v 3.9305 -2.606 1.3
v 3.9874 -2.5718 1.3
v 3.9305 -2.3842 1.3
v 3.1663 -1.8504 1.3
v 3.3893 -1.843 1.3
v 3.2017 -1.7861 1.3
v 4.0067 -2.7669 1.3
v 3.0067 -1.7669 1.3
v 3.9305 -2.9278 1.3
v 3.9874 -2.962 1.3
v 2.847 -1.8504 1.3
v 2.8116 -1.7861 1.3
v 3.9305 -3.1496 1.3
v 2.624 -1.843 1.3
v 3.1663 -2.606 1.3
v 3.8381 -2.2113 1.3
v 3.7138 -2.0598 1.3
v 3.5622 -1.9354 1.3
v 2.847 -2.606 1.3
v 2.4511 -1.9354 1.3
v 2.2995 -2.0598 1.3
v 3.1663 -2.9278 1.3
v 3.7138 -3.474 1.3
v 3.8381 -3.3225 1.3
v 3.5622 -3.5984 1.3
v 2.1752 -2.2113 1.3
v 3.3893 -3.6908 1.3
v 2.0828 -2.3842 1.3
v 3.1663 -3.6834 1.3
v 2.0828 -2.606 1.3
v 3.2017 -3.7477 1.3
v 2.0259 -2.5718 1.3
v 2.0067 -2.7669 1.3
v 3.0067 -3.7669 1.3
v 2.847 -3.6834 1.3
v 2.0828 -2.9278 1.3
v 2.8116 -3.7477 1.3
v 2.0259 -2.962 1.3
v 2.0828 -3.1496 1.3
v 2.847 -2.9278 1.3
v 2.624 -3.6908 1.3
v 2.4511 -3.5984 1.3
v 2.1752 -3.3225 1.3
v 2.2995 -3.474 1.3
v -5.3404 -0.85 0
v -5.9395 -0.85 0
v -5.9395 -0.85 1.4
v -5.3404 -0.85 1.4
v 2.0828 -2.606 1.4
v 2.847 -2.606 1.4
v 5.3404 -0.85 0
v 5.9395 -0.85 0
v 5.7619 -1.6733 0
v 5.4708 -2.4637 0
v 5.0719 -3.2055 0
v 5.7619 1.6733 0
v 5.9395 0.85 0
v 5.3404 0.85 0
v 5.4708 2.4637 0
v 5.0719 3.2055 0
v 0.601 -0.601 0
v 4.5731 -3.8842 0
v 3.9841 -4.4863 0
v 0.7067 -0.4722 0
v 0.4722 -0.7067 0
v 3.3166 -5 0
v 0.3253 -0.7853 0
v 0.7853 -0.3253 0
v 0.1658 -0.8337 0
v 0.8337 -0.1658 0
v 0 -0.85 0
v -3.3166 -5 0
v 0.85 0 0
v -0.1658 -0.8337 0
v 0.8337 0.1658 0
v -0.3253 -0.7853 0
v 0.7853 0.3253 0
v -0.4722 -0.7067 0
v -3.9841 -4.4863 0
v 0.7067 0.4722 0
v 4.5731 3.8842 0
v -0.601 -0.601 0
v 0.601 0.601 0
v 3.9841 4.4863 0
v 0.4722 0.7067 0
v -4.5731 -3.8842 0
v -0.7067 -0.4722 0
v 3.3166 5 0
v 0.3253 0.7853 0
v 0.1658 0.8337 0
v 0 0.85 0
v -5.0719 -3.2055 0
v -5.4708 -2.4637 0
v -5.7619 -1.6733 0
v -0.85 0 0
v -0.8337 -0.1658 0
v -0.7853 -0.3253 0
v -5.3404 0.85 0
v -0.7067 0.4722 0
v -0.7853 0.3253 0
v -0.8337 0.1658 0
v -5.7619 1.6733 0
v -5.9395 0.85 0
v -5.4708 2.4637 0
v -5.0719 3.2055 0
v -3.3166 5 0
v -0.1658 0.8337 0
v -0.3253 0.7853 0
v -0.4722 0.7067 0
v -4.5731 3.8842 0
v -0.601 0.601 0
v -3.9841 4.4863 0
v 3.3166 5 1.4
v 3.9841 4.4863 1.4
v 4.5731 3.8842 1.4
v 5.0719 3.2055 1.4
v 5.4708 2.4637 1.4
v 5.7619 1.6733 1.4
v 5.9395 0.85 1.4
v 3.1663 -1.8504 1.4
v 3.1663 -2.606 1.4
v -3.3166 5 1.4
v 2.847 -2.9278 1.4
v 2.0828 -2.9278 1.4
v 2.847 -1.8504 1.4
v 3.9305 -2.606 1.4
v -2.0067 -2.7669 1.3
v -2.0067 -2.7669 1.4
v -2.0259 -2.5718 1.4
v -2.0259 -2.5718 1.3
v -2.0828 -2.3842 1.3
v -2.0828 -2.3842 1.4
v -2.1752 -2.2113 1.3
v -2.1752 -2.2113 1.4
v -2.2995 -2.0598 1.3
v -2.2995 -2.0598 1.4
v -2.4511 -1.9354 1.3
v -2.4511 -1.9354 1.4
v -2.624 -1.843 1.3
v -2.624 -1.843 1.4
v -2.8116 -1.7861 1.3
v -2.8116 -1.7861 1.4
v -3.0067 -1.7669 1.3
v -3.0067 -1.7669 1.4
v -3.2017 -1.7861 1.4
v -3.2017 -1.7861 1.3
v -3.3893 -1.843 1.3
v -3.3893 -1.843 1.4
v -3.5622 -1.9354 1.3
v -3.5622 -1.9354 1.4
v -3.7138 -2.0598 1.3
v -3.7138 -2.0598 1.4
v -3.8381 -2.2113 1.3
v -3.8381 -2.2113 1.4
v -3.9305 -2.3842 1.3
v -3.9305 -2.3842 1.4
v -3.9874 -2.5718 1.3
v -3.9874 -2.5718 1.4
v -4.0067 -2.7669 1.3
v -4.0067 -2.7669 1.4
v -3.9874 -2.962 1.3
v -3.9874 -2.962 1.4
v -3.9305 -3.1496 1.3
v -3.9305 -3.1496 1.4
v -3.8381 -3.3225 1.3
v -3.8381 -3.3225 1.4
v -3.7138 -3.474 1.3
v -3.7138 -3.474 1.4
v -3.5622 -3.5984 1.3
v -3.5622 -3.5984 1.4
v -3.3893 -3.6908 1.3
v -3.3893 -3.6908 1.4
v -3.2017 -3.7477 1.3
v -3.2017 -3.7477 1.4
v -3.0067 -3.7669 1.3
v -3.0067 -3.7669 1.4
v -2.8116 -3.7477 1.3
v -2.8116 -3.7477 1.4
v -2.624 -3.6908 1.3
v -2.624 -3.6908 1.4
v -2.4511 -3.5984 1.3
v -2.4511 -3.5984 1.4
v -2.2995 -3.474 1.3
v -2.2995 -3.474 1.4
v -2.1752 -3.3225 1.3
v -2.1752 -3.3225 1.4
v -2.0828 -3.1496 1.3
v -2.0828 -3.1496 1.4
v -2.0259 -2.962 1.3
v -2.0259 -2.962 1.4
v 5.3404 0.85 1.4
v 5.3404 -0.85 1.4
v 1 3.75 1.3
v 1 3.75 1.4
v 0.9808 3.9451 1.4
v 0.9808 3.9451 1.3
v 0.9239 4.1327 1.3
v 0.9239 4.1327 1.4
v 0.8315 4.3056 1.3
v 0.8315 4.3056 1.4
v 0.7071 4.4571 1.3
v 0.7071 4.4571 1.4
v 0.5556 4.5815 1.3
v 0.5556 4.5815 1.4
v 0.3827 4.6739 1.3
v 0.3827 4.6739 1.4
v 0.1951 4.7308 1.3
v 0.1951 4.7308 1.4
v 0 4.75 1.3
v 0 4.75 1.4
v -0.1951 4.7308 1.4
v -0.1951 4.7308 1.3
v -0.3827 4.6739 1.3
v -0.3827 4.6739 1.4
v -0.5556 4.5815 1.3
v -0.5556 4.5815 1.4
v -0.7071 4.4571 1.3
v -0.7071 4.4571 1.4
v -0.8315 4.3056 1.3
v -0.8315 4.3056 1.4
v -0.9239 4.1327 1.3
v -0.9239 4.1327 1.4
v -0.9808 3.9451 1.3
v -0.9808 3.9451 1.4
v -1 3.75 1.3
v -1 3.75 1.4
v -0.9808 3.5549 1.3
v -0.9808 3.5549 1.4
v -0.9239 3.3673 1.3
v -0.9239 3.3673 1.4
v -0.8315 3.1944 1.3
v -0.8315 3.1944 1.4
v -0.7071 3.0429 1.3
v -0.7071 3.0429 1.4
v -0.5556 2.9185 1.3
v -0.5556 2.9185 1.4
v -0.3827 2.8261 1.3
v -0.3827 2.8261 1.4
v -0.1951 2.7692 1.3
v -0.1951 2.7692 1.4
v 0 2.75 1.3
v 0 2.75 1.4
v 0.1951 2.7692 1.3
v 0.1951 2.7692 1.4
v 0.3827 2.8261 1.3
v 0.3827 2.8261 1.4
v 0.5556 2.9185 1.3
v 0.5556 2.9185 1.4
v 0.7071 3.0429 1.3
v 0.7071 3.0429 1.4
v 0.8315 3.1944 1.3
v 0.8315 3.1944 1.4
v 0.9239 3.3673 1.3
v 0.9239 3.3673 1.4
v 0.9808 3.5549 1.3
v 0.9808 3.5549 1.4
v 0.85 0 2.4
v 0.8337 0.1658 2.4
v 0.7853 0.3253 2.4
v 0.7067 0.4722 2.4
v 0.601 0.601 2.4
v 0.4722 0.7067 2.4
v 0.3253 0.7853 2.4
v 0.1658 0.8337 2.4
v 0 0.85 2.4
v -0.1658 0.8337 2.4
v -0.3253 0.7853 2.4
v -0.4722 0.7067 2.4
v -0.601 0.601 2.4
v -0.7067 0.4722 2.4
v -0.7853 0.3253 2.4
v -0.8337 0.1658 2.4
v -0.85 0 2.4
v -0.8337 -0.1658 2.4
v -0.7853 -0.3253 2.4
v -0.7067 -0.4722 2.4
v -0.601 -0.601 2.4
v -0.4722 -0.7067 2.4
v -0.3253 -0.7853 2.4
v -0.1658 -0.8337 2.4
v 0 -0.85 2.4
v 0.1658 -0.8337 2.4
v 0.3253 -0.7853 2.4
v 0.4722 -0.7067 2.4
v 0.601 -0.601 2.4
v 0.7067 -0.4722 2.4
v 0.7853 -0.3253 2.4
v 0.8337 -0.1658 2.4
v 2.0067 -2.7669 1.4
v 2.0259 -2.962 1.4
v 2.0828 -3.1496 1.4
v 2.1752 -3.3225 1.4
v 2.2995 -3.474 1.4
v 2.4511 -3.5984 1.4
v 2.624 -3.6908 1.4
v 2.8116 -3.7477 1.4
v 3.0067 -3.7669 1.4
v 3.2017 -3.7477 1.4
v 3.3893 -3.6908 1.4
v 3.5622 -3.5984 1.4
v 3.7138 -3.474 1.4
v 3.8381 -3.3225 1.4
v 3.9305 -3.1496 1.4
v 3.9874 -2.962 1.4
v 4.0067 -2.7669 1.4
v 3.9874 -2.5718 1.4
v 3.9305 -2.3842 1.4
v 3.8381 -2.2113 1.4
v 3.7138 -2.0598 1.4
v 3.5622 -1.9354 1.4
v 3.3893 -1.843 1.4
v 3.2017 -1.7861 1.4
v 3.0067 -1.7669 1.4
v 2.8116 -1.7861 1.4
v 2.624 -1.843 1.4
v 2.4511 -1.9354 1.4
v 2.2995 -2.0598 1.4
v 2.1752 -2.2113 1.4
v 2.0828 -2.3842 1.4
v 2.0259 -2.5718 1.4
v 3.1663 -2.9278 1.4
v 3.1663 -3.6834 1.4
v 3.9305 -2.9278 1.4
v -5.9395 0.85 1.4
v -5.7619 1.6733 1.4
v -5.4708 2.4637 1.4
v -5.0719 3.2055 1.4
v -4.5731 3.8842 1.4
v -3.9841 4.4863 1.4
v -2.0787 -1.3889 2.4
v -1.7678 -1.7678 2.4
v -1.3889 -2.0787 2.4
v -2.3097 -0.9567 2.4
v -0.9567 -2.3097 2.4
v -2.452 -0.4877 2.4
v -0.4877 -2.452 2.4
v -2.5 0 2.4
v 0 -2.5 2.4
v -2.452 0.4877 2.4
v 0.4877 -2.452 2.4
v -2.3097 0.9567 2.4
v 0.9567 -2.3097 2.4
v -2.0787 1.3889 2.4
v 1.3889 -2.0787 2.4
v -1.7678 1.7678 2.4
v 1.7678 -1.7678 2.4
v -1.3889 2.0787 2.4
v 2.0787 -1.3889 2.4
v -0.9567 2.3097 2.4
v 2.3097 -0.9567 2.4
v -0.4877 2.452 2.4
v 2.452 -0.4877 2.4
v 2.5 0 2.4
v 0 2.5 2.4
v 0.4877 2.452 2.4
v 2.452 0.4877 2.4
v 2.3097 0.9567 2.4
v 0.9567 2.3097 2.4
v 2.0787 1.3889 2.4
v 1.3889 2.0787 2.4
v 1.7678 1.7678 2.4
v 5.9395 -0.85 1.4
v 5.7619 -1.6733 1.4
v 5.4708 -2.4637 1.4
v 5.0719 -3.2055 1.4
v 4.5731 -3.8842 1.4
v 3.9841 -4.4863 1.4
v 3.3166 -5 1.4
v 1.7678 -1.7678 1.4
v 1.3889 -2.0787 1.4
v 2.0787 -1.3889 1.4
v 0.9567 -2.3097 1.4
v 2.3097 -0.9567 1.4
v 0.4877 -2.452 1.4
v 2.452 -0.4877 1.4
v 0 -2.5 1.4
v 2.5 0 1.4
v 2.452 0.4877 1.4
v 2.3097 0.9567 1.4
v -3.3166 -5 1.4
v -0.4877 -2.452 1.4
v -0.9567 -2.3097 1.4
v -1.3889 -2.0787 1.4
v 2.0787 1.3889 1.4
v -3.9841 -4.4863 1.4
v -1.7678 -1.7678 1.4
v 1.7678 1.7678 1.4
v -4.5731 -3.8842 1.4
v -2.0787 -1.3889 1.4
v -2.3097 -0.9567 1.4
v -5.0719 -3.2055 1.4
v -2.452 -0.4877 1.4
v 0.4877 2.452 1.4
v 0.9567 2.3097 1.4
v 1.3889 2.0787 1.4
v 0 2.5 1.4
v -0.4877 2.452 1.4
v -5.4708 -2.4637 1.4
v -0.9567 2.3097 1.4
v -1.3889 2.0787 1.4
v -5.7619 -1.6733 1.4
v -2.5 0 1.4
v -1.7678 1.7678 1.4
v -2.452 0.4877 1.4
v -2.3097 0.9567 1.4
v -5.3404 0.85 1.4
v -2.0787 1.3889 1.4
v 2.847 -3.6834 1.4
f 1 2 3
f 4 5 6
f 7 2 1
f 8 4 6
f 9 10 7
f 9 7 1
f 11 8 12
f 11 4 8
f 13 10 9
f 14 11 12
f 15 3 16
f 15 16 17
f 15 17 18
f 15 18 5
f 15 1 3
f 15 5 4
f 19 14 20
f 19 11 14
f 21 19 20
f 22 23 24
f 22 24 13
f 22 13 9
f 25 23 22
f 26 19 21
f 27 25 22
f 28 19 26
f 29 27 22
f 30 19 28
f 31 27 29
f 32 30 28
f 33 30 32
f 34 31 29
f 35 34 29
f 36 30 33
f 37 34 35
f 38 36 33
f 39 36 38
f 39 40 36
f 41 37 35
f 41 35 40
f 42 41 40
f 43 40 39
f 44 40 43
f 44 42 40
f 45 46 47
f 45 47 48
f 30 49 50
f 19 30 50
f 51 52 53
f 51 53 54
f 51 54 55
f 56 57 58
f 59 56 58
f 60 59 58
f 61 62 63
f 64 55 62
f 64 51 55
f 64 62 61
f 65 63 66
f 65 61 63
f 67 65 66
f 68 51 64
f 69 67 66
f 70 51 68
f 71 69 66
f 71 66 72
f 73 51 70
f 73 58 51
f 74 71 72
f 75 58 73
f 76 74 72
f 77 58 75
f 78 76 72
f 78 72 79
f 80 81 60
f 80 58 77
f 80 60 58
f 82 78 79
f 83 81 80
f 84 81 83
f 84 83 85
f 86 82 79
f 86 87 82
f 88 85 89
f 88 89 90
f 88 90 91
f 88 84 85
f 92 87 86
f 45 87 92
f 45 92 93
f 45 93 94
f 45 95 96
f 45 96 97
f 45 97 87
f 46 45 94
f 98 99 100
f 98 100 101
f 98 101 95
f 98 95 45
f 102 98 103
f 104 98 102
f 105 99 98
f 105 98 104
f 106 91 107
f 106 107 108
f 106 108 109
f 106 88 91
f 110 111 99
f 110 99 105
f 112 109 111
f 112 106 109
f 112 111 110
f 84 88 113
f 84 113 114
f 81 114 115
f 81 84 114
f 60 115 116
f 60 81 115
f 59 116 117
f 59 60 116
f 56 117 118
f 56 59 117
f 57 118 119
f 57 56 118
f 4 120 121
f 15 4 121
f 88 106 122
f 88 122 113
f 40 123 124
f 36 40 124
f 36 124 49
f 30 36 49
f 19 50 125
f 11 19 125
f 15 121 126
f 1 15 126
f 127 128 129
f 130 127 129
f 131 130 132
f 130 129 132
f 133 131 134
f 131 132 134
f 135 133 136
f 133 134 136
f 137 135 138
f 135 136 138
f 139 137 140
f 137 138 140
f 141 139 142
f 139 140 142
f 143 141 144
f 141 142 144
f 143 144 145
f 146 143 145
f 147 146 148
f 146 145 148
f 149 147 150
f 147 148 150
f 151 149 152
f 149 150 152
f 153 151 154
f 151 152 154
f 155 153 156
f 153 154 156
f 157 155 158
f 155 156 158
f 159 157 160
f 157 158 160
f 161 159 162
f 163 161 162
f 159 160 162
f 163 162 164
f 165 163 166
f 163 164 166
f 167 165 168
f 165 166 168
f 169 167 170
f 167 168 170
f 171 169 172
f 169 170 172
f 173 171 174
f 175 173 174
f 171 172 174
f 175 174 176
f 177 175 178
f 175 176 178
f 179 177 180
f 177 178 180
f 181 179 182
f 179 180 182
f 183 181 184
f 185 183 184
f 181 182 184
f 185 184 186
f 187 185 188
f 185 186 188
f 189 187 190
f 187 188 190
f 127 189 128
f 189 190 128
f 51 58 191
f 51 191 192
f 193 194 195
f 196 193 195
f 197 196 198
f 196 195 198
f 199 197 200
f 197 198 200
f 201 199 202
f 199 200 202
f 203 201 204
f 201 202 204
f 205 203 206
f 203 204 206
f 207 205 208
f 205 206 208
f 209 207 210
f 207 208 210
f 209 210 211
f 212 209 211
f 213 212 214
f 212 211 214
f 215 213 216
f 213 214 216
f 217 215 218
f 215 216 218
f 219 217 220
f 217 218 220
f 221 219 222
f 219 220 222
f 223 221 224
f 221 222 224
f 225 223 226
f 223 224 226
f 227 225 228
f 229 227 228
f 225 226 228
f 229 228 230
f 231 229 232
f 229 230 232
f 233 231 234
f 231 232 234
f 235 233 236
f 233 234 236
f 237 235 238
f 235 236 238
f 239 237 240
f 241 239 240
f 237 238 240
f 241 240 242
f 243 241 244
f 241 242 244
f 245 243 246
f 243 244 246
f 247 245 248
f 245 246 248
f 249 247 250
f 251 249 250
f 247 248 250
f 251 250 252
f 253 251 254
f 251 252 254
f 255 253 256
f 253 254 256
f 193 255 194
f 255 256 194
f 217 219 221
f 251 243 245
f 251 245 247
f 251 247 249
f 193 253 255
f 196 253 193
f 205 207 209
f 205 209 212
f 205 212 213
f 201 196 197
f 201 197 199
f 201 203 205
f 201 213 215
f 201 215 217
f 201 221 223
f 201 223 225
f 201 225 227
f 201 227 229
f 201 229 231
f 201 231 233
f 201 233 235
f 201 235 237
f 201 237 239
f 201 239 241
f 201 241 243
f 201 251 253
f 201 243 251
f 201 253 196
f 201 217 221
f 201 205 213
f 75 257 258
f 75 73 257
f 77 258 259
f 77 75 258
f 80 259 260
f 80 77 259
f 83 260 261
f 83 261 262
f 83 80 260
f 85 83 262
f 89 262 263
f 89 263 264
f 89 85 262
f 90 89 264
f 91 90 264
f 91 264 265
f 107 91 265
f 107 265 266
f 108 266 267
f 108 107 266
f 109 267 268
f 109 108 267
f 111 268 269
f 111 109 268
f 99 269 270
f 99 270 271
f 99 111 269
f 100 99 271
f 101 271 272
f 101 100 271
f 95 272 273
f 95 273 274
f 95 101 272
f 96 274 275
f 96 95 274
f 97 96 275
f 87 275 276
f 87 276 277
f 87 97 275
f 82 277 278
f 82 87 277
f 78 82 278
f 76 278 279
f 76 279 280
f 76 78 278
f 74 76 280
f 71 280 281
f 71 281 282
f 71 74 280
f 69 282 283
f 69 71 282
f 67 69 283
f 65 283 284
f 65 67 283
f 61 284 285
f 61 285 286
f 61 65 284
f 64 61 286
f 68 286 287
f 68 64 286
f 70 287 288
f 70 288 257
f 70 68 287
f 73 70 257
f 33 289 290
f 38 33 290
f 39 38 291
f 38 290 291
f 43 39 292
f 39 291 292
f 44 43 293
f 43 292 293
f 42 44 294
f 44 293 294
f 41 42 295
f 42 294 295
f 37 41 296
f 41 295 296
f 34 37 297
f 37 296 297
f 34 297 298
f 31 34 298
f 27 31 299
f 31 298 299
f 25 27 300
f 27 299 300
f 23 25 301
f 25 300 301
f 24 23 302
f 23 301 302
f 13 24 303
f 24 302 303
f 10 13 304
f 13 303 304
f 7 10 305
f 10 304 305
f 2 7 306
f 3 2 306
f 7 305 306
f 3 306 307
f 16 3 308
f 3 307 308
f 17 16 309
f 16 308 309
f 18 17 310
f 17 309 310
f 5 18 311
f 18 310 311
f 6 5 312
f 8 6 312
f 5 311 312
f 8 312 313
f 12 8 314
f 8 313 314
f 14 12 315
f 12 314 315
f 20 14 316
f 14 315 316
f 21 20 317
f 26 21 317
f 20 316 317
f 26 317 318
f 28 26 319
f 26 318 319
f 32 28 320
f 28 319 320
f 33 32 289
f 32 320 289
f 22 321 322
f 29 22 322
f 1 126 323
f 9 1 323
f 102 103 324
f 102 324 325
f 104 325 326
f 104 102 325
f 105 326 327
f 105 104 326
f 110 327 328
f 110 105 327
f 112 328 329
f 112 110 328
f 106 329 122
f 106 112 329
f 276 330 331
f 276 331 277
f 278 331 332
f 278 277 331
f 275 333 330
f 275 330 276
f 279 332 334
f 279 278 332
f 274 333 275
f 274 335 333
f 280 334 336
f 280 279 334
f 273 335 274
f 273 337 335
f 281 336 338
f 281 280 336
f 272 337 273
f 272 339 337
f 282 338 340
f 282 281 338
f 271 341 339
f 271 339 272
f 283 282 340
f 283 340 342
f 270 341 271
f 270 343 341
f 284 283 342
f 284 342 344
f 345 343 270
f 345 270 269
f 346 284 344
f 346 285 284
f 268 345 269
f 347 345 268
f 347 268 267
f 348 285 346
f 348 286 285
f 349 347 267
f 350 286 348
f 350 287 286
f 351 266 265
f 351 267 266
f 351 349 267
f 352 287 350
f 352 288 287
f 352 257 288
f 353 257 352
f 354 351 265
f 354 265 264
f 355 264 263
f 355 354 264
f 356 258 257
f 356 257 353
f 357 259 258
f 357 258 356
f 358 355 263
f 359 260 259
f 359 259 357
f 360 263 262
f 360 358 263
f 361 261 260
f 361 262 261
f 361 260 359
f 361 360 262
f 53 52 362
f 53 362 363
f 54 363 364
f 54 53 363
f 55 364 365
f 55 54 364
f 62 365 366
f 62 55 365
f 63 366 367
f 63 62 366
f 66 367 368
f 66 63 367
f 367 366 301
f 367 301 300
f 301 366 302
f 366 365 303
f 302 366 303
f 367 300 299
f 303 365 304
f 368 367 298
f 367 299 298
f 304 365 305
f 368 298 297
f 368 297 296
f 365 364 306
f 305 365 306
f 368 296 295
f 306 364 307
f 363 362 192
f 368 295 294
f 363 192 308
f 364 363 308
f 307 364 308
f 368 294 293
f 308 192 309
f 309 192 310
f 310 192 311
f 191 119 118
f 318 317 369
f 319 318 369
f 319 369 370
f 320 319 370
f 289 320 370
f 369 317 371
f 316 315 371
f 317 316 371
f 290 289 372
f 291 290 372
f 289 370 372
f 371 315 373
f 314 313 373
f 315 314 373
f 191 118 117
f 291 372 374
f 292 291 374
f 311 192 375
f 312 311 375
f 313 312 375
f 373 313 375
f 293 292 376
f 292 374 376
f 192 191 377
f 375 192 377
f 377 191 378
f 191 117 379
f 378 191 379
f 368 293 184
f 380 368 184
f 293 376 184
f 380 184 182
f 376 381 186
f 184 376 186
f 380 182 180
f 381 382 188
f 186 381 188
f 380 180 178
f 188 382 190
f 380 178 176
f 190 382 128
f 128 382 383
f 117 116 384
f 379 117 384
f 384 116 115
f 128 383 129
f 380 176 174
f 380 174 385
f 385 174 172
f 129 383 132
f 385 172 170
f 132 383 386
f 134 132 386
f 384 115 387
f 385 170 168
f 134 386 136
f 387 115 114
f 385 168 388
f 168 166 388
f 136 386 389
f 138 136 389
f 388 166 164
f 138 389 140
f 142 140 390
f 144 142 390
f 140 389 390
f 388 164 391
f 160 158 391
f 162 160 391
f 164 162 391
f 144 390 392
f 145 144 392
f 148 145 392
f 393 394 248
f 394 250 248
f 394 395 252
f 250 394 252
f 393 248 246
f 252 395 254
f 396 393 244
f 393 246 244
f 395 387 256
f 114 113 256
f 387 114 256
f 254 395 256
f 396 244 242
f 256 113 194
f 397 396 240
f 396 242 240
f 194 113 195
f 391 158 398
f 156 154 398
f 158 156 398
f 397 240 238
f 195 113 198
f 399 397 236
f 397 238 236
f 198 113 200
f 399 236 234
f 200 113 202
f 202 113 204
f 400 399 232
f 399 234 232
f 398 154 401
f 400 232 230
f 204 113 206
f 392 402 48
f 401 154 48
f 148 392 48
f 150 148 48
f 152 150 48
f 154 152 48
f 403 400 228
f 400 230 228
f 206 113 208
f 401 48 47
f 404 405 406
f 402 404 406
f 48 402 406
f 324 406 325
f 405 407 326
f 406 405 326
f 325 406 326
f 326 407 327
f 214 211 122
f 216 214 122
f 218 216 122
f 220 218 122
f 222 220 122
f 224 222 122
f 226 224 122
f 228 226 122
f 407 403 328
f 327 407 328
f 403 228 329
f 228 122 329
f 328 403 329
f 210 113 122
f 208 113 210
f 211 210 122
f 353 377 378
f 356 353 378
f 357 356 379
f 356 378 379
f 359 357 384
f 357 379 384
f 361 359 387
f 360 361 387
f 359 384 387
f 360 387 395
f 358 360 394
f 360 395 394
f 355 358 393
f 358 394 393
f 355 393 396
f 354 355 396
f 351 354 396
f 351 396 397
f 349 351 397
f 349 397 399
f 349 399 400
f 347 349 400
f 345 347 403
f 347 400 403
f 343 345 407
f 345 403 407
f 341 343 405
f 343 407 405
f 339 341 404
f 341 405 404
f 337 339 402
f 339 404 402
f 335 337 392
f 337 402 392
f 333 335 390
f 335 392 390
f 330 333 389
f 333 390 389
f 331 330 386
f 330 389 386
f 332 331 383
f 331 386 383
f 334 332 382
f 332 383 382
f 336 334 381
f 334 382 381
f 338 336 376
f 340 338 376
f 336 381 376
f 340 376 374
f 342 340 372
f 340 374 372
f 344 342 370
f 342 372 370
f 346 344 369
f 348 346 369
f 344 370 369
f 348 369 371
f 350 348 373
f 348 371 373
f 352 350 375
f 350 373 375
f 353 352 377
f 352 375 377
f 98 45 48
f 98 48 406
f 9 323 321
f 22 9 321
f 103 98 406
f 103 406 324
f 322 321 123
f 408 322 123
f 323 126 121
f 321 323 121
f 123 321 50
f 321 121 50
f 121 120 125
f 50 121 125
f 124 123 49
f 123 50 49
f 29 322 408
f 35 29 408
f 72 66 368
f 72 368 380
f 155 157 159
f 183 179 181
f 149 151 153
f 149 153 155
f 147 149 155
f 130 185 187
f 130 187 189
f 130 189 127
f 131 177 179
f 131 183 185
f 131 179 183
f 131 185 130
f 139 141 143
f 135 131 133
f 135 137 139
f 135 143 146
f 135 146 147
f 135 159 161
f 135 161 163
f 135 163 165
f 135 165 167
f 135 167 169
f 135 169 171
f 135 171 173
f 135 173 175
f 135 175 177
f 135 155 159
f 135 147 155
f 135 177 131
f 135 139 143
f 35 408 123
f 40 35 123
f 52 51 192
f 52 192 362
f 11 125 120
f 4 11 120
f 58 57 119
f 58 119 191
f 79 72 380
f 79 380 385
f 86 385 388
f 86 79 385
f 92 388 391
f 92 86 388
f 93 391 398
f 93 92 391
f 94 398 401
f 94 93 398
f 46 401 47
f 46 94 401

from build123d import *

# Parameters (mm, degrees)
SKETCH1_R           = 0.85
BOSS_EXTRUDE1_DEPTH = 1.4
SKETCH2_R           = 2.5
SKETCH2_R_2         = 0.85
BOSS_EXTRUDE2_DEPTH = 1
SKETCH3_R           = 1
CUT_EXTRUDE1_DEPTH  = 0.1


with BuildPart() as part:
    # Sketch1 → Boss-Extrude1 (new body)
    with BuildSketch(Plane.XY):
        with BuildLine():
            Line((-5.340410415, 0.85), (-5.93948651, 0.85))
            ThreePointArc((-5.93948651, 0.85), (-5.071934946, 3.205538317), (-3.31662479, 5))
            Line((-3.31662479, 5), (3.31662479, 5))
            ThreePointArc((3.31662479, 5), (5.071934946, 3.205538317), (5.93948651, 0.85))
            Line((5.93948651, 0.85), (5.340410415, 0.85))
            Line((5.340410415, 0.85), (5.340410415, -0.85))
            Line((5.340410415, -0.85), (5.93948651, -0.85))
            ThreePointArc((5.93948651, -0.85), (5.071934946, -3.205538317), (3.31662479, -5))
            Line((3.31662479, -5), (-3.31662479, -5))
            ThreePointArc((-3.31662479, -5), (-5.071934946, -3.205538317), (-5.93948651, -0.85))
            Line((-5.93948651, -0.85), (-5.340410415, -0.85))
            Line((-5.340410415, -0.85), (-5.340410415, 0.85))
        make_face()
        Circle(SKETCH1_R, mode=Mode.SUBTRACT)
    extrude(amount=BOSS_EXTRUDE1_DEPTH)

    # Sketch2 → Boss-Extrude2 (add)
    with BuildSketch(Plane.XY.offset(1.4)):
        Circle(SKETCH2_R)
        Circle(SKETCH2_R_2, mode=Mode.SUBTRACT)
    extrude(amount=BOSS_EXTRUDE2_DEPTH)

    # Sketch3 → Cut-Extrude1 (cut)
    # profile 1 of 3: a face of its own
    with BuildSketch(Plane.XY.offset(1.4)):
        with Locations((0, 3.75)):
            Circle(SKETCH3_R)
    # profile 2 of 3: a face of its own
    with BuildSketch(Plane.XY.offset(1.4)):
        with Locations((-3.006653395, -2.766898706)):
            Circle(SKETCH3_R)
    # profile 3 of 3: a face of its own
    with BuildSketch(Plane.XY.offset(1.4)):
        with Locations(Location((3.006653395, -2.766898706, 0), (0, 0, 180))):
            Circle(SKETCH3_R)
        Polygon((3.166281654, -2.605998411), (3.930459475, -2.605998411), (3.930459475, -2.927799001), (3.166281654, -2.927799001), (3.166281654, -3.683401413), (2.847025136, -3.683401413), (2.847025136, -2.927799001), (2.082847315, -2.927799001), (2.082847315, -2.605998411), (2.847025136, -2.605998411), (2.847025136, -1.850395999), (3.166281654, -1.850395999), align=None, mode=Mode.SUBTRACT)
    extrude(amount=-CUT_EXTRUDE1_DEPTH, mode=Mode.SUBTRACT)


solid = part.part
